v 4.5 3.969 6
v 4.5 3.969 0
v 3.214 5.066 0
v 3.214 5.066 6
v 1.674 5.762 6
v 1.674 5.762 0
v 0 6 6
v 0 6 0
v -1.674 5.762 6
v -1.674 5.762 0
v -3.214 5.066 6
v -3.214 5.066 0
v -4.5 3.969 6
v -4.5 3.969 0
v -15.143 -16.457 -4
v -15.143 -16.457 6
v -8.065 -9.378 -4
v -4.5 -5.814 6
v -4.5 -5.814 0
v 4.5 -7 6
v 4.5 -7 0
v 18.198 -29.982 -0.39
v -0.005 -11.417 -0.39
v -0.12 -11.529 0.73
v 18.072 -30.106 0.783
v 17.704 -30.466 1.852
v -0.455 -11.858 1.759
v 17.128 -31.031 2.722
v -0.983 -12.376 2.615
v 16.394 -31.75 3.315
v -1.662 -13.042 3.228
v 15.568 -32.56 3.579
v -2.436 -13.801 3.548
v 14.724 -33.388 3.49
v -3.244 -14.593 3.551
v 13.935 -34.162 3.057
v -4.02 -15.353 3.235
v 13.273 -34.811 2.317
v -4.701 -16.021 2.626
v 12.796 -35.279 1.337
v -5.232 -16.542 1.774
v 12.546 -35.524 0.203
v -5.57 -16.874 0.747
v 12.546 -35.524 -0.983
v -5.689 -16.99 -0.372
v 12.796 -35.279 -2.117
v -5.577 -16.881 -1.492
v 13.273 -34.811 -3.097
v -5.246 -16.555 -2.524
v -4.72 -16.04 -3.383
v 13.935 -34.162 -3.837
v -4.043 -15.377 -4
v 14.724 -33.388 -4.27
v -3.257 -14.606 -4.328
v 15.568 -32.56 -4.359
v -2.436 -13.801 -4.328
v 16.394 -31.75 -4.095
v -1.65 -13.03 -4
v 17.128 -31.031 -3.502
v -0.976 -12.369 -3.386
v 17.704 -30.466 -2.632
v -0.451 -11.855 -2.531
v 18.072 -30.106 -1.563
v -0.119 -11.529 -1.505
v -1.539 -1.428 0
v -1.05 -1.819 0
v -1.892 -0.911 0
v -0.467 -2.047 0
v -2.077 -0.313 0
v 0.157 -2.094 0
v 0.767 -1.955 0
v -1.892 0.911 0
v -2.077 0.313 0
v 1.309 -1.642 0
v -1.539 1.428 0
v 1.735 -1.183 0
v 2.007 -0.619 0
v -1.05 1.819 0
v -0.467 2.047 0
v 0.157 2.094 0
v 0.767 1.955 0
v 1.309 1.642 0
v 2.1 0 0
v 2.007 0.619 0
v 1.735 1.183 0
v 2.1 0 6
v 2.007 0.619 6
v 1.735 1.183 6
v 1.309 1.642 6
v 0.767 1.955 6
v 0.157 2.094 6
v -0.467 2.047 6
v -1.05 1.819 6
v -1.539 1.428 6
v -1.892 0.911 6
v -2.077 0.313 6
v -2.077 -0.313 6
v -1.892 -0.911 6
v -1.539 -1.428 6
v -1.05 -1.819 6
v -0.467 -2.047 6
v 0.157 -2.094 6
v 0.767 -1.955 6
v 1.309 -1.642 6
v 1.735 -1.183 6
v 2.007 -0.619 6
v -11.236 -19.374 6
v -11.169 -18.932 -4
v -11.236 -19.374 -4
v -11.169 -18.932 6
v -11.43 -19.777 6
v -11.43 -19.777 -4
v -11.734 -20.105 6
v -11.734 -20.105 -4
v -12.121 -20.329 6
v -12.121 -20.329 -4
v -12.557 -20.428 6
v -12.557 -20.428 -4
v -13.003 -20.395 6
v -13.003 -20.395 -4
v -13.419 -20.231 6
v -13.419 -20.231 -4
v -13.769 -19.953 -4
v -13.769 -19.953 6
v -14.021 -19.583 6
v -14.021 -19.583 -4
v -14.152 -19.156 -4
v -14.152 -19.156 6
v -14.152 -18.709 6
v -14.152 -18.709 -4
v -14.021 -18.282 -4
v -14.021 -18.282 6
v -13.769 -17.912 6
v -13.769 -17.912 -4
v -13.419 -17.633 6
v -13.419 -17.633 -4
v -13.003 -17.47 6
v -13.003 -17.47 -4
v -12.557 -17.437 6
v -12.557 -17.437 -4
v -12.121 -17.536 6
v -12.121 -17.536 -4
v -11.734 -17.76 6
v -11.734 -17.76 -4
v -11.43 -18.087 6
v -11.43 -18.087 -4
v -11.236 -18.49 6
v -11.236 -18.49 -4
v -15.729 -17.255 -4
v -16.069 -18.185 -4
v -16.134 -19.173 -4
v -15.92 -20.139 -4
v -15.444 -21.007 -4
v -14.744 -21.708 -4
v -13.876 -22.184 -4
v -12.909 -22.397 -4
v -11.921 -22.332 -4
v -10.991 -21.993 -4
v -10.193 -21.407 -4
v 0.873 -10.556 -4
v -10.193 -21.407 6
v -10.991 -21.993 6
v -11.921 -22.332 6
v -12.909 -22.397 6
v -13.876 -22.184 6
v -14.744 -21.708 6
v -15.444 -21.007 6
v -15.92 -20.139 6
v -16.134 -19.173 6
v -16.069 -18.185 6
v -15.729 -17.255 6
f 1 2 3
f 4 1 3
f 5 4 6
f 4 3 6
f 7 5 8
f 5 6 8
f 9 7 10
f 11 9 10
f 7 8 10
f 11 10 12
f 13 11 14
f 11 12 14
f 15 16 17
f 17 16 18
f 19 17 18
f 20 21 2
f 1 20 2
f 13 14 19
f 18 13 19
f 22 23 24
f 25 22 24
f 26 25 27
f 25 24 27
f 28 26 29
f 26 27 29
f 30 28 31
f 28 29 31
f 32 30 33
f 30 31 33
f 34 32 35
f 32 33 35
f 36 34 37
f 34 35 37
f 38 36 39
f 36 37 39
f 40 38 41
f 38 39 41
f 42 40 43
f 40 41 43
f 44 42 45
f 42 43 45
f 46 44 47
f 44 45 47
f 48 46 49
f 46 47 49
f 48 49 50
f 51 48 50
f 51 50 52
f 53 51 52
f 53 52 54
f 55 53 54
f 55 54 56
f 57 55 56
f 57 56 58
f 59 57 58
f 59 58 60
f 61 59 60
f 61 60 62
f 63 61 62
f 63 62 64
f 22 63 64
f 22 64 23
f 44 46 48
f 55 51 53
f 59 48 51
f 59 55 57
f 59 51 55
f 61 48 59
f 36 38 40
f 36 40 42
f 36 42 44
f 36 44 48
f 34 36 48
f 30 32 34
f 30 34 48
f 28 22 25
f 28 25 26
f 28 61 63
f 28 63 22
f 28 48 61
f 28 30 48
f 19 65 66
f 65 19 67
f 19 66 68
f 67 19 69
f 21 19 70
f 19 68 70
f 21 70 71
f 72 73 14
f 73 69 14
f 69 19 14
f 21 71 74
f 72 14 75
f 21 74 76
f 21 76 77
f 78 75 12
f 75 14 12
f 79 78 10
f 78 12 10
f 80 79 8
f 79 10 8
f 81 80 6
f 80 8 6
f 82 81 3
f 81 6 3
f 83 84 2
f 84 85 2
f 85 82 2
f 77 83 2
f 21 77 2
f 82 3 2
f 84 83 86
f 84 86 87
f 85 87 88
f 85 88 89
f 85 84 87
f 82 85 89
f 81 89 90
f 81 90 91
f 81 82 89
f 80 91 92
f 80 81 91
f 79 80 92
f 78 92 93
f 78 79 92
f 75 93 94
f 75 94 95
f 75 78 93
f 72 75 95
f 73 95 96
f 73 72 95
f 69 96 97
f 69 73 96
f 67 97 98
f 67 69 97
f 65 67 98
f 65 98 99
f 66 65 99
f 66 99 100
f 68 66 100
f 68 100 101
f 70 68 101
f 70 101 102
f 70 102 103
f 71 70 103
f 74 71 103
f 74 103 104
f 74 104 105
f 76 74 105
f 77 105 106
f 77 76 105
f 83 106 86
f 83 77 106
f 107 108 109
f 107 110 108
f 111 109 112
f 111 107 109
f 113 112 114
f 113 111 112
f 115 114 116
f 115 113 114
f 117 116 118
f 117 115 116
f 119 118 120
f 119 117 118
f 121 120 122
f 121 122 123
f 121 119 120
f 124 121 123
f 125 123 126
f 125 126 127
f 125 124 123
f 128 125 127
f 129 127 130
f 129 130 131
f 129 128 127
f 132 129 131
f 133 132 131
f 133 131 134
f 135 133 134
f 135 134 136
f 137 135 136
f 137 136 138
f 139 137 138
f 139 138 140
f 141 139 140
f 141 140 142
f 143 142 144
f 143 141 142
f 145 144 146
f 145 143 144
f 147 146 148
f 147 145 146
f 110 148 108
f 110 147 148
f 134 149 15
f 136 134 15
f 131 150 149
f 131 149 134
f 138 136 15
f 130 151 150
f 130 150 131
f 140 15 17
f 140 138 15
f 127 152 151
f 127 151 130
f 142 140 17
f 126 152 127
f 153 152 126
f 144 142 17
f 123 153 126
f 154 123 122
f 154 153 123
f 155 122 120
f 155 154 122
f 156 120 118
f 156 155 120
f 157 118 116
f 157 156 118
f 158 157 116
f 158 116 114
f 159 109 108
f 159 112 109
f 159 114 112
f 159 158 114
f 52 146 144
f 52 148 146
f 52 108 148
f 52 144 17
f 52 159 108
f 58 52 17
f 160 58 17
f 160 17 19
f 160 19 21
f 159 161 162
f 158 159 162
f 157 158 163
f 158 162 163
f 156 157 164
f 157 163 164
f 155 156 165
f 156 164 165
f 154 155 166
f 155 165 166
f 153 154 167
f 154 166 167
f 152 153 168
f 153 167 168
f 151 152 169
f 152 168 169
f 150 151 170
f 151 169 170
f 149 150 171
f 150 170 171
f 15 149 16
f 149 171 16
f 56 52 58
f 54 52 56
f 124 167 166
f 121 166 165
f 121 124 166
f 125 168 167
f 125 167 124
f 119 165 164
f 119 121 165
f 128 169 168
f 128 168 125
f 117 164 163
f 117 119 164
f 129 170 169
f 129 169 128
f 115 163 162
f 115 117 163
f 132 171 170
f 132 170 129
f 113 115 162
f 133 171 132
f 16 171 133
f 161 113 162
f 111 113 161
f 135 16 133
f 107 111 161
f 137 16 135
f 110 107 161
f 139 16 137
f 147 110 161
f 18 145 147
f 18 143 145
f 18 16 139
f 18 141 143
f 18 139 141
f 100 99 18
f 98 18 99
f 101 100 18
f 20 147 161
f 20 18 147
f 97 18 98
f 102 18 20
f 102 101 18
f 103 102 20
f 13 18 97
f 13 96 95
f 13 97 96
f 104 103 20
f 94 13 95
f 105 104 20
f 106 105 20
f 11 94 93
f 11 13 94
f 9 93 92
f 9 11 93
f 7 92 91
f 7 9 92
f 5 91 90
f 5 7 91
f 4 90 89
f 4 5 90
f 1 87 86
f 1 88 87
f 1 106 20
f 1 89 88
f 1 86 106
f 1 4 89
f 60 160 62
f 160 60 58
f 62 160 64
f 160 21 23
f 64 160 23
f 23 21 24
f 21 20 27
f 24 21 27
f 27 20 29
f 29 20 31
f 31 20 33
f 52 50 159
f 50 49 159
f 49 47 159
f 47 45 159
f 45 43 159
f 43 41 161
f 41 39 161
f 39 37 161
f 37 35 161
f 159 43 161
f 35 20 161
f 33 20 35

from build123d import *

# Parameters (mm, degrees)
F0_R     = 1.5
F0_R_2   = 2.1
F1_DEPTH = 6
F2_R     = 3.98
F3_DEPTH = 26
F4_R     = 1.5
F5_DEPTH = 4
F6_SIZE  = 3.99999


# Not quite as in the source:
# - a fillet or chamfer is up to 0.001 mm smaller than in the source, because OpenCascade refuses the exact size


with BuildPart() as f1:
    # F0 (on Top) → F1 (new body)
    with BuildSketch(Plane.XY):
        with BuildLine():
            Line((4.5, 0), (4.5, 3.9686269666))
            ThreePointArc((4.5, 3.9686269666), (0, 6), (-4.5, 3.9686269666))
            Line((-4.5, 3.9686269666), (-4.5, 0))
            Line((-4.5, 0), (-4.5, -5.813701588))
            Line((-4.5, -5.813701588), (-15.143203234, -16.4569048219))
            ThreePointArc((-15.143203234, -16.4569048219), (-15.1189316865, -21.3823807428), (-10.1934557657, -21.4066522902))
            Line((-10.1934557657, -21.4066522902), (4.5, -7))
            Line((4.5, -7), (4.5, 0))
        make_face()
        with Locations((-12.6691633098, -18.9323580438)):
            Circle(F0_R, mode=Mode.SUBTRACT)
        Circle(F0_R_2, mode=Mode.SUBTRACT)
    extrude(amount=F1_DEPTH)

    # F2 (on face) → F3 (join)
    with BuildSketch(Plane(origin=(5.7049735344, -5.8185465008, 0), x_dir=(0.7140411723, 0.7001037097, 0), z_dir=(0.7001037097, -0.7140411723, 0))):
        with Locations((-11.9764822387, -0.39)):
            Circle(F2_R)
    extrude(amount=F3_DEPTH)

    # F4 (on face) → F5 (join)
    with BuildSketch(Plane(origin=(0, 0, 0), x_dir=(1, 0, 0), z_dir=(0, 0, -1))):
        with BuildLine():
            ThreePointArc((-10.1934557657, 21.4066522902), (-15.1189316865, 21.3823807428), (-15.143203234, 16.4569048219))
            Line((-15.143203234, 16.4569048219), (-4.5, 5.813701588))
            Line((-4.5, 5.813701588), (4.5, 7))
            Line((4.5, 7), (-10.1934557657, 21.4066522902))
        make_face()
        with Locations((-12.6691633098, 18.9323580438)):
            Circle(F4_R, mode=Mode.SUBTRACT)
    extrude(amount=F5_DEPTH)

    # F6 (size 4 in the source; OpenCascade refuses exactly that, so slightly less here)
    f6_edges = [f1.edges().sort_by_distance(p)[0] for p in [
        (0, -6.406851, -4),
    ]]
    chamfer(f6_edges, length=F6_SIZE)


solid = f1.part
